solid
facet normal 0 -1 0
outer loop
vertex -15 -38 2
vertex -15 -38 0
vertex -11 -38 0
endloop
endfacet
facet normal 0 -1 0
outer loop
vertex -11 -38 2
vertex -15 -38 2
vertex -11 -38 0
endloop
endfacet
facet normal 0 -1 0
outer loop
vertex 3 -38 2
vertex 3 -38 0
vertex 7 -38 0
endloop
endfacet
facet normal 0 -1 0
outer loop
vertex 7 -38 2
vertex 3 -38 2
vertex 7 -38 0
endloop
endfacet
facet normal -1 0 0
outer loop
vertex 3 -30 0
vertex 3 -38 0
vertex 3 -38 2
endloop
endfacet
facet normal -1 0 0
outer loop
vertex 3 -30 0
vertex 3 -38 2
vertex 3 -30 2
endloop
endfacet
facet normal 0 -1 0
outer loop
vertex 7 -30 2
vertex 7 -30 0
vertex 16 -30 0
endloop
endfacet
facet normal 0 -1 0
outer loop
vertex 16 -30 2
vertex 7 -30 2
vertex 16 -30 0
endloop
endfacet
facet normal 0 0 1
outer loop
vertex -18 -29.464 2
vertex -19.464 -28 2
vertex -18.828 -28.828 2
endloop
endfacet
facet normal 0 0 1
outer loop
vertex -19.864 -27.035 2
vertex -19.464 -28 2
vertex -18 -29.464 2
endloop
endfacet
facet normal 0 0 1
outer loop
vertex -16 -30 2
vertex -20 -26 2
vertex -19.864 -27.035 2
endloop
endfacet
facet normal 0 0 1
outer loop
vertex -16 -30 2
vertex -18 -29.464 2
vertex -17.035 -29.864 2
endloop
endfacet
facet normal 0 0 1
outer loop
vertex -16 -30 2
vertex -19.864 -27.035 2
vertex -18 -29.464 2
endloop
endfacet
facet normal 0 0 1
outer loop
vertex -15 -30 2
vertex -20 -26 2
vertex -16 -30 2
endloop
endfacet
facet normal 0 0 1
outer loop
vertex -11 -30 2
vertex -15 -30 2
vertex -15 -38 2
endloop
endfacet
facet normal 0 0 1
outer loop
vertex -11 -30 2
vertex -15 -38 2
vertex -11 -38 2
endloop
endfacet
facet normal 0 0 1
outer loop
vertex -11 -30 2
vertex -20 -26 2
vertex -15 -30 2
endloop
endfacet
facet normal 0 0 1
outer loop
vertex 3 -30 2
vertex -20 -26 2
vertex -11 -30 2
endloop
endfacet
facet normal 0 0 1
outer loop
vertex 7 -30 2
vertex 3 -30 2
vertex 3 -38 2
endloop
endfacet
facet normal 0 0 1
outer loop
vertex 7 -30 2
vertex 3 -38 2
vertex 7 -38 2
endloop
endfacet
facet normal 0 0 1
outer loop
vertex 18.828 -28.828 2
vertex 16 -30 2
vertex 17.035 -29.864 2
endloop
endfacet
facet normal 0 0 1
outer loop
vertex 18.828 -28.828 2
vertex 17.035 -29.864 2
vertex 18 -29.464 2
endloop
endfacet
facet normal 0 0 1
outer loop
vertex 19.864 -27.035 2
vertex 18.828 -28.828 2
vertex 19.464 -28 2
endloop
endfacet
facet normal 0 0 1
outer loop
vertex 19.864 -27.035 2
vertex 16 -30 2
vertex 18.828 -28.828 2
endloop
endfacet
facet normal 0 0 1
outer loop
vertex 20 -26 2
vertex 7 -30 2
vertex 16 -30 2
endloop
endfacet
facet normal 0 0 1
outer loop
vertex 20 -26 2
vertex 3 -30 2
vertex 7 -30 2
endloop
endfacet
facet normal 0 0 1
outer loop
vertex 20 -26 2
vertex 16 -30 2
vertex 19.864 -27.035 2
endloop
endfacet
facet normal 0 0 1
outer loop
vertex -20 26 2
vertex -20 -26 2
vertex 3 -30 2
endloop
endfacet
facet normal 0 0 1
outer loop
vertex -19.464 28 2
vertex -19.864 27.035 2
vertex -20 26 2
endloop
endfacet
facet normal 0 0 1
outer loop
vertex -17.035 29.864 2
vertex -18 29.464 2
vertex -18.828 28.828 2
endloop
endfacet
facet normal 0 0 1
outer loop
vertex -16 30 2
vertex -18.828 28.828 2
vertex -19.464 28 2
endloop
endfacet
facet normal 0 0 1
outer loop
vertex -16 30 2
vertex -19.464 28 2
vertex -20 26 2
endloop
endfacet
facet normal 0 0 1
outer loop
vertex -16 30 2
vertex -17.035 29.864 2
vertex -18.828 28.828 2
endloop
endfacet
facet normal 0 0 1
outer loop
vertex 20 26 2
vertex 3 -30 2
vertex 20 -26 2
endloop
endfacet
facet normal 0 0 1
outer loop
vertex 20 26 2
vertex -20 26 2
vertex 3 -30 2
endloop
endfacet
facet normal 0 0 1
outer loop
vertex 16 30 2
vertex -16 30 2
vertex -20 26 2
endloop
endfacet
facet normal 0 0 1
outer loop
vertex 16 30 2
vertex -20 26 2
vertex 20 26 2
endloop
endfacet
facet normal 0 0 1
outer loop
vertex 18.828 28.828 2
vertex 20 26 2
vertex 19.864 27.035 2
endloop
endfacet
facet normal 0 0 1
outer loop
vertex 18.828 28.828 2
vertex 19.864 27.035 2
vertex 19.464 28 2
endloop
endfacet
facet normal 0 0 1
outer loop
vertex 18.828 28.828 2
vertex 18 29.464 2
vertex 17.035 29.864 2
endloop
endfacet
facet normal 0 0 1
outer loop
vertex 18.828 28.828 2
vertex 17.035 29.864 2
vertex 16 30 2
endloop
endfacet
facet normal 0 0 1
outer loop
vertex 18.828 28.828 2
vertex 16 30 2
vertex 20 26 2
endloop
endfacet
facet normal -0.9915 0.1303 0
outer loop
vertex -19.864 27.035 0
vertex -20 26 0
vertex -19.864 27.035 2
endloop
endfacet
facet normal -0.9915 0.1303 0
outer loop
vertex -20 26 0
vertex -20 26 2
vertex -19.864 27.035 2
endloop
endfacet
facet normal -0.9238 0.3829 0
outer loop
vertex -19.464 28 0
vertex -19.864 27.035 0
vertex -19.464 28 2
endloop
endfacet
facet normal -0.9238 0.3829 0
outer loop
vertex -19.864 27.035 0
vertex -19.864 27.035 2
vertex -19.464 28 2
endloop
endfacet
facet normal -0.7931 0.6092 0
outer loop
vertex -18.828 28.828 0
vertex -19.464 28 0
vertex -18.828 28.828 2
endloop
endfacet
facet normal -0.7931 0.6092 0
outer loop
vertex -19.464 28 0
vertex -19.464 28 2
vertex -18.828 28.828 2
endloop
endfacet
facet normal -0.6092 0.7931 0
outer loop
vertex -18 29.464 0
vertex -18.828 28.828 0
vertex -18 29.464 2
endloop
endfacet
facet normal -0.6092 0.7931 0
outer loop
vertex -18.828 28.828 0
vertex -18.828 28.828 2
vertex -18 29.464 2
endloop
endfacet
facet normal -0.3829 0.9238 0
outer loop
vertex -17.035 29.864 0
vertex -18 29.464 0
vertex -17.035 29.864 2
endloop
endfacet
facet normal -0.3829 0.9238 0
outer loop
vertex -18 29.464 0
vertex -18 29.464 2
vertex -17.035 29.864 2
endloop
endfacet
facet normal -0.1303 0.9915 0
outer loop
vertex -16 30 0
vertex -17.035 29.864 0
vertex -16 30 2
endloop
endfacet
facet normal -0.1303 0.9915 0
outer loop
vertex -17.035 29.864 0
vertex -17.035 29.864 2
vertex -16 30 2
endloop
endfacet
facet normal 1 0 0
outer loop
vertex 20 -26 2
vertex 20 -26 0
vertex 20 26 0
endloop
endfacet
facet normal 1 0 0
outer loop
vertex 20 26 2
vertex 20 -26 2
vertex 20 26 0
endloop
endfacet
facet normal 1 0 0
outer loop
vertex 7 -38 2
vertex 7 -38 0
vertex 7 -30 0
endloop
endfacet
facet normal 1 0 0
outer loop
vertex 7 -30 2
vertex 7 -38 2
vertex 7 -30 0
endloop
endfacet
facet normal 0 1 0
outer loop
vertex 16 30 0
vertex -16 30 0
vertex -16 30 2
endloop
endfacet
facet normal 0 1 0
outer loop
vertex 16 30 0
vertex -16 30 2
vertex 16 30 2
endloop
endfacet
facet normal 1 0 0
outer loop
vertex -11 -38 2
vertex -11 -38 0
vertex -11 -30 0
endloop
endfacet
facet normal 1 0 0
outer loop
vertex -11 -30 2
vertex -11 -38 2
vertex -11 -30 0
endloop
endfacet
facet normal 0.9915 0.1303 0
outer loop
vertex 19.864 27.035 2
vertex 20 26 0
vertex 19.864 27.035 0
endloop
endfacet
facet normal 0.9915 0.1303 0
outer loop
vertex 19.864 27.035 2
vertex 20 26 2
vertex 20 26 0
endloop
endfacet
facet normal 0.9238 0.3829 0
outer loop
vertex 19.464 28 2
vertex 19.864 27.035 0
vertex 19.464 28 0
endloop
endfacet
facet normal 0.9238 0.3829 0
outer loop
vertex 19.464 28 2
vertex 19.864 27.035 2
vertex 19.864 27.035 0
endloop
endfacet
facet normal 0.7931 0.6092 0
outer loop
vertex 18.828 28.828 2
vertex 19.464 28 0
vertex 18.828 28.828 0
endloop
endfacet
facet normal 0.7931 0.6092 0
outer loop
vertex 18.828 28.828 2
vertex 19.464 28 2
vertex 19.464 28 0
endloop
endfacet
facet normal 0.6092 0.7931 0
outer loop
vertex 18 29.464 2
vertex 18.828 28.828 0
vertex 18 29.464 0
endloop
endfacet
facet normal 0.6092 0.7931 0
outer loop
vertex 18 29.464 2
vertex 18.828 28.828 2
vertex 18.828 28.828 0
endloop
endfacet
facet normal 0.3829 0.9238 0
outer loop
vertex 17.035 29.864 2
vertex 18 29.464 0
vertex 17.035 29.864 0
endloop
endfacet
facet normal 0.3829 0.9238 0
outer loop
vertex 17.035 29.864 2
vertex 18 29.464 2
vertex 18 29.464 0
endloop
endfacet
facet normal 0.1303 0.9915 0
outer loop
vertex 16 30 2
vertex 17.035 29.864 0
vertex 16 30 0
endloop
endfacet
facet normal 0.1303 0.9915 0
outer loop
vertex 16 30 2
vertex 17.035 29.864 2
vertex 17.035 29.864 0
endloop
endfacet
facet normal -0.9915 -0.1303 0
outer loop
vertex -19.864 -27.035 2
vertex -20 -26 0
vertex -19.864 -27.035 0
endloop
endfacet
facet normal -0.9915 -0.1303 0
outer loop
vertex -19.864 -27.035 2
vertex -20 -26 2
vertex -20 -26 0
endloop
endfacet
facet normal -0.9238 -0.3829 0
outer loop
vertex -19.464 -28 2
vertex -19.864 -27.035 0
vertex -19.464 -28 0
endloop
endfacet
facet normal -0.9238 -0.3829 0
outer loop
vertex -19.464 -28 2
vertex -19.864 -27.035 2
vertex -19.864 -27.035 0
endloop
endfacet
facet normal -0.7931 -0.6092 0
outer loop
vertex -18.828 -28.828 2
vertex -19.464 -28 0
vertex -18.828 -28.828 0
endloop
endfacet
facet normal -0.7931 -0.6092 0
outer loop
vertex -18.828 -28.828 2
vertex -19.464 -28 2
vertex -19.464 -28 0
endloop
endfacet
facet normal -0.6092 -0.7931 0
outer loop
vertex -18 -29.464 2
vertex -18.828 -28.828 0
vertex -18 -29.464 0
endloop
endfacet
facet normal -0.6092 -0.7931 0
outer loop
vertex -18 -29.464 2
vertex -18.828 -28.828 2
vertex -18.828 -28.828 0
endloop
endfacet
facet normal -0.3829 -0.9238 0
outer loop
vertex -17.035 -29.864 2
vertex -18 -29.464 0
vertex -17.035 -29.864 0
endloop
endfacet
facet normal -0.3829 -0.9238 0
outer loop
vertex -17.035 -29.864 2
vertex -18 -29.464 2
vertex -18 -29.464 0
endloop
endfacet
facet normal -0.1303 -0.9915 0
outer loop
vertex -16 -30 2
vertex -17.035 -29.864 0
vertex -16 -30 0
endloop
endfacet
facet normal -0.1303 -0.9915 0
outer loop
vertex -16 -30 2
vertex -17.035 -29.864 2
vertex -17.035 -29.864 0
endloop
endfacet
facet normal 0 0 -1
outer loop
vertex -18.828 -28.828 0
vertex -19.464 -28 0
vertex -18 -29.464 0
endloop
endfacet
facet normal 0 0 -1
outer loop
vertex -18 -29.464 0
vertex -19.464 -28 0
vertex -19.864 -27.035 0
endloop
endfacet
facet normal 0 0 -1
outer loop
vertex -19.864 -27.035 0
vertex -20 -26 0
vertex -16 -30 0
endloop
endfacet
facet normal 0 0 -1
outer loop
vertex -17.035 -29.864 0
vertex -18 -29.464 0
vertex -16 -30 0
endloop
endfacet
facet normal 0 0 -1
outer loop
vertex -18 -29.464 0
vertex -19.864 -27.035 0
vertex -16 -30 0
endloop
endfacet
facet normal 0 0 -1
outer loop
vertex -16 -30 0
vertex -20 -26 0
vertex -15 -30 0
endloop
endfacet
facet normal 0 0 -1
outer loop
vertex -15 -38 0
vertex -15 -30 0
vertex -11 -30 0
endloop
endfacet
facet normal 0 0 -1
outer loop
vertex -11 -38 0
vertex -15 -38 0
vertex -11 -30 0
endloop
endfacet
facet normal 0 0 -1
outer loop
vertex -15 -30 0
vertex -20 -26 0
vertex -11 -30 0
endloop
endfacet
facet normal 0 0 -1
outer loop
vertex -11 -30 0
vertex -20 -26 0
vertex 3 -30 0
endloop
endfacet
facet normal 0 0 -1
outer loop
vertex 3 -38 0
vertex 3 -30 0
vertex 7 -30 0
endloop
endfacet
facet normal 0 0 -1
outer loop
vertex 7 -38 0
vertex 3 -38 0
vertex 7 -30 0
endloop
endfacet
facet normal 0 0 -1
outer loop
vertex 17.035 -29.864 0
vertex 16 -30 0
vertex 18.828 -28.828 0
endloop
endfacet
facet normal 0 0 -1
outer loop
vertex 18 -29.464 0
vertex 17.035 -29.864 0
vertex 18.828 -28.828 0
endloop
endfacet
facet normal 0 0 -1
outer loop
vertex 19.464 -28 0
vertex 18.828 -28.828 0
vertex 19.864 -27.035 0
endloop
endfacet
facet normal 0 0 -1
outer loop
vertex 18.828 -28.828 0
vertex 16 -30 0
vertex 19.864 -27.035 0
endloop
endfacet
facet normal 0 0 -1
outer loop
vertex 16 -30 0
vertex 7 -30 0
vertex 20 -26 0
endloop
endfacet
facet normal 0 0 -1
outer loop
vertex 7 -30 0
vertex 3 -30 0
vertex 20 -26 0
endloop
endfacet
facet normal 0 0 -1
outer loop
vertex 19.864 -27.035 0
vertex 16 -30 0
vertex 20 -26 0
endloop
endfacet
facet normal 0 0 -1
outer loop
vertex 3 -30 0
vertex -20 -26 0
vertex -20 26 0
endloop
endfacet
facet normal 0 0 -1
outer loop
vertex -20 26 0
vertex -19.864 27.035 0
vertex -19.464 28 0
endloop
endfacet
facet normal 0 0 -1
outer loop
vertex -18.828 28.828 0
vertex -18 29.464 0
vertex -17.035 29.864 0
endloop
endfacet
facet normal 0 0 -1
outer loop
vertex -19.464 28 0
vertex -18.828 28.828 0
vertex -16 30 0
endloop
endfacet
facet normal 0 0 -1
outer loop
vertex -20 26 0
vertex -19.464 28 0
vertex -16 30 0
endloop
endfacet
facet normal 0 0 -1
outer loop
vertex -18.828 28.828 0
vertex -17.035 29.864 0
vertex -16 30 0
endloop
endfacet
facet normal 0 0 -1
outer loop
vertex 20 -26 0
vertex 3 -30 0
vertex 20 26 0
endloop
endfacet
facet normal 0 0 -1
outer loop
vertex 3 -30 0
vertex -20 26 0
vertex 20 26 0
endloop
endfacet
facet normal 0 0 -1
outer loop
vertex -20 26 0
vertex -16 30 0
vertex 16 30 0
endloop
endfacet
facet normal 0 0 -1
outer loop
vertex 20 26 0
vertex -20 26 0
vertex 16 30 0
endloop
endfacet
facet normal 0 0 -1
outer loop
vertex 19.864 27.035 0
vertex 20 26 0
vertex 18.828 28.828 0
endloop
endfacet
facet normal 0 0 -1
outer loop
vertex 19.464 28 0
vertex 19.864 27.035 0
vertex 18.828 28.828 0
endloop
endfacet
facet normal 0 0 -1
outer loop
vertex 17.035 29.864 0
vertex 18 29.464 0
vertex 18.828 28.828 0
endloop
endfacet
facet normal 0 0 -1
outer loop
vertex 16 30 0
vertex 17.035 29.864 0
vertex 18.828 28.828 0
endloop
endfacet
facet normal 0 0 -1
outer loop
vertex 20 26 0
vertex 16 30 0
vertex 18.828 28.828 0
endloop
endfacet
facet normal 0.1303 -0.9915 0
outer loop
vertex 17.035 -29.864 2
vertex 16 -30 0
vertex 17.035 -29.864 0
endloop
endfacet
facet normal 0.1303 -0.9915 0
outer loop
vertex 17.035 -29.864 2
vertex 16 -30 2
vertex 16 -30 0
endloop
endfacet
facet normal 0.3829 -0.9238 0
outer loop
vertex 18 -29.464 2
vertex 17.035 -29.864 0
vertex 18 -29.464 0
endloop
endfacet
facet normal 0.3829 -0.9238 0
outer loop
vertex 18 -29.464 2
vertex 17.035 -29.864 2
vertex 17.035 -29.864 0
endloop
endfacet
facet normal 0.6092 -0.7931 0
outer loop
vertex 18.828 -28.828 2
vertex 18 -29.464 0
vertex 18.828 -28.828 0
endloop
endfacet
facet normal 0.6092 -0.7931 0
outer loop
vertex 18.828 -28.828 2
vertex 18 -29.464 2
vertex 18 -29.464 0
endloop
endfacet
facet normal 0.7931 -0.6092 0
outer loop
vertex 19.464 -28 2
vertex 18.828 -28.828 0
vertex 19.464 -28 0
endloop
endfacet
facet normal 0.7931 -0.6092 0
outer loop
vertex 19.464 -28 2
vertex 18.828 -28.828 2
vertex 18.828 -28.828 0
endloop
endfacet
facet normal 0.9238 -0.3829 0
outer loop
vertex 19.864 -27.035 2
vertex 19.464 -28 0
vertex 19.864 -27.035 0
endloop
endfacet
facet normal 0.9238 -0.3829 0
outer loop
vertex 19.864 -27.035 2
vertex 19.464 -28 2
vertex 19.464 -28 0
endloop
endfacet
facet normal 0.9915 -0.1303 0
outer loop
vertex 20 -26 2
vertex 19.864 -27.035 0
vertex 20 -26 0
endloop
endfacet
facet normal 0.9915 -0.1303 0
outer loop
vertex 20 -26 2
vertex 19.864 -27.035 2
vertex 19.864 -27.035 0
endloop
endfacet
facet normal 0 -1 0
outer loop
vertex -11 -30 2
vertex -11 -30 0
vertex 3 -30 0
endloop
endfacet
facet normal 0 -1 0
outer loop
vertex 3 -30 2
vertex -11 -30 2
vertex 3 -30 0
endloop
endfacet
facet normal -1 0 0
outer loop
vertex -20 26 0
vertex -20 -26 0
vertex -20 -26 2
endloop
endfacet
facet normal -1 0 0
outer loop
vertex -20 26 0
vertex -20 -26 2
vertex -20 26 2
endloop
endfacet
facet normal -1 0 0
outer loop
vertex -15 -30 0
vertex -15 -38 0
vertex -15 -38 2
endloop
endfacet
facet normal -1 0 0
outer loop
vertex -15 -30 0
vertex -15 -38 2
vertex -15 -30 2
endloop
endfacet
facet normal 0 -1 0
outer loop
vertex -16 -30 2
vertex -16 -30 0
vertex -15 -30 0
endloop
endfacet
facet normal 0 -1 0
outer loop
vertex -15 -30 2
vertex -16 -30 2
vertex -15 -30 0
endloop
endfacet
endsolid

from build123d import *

# Parameters (mm, degrees)
SKETCH_1_W      = 40
SKETCH_1_H      = 60
SKETCH_1_W_2    = 4
SKETCH_1_H_2    = 8
EXTRUDE_1_DEPTH = 2
FILLET_1_R      = 4


with BuildPart() as part:
    # 草图1 → 凸台-拉伸1 (new body)
    with BuildSketch(Plane.XY):
        Rectangle(SKETCH_1_W, SKETCH_1_H)
        with Locations((-13, -34)):
            Rectangle(SKETCH_1_W_2, SKETCH_1_H_2)
        with Locations((5, -34)):
            Rectangle(SKETCH_1_W_2, SKETCH_1_H_2)
    extrude(amount=EXTRUDE_1_DEPTH)

    # 圆角1
    fillet_1_edges = [part.edges().sort_by_distance(p)[0] for p in [
        (20, -30, 1),
        (-20, -30, 1),
        (-20, 30, 1),
        (20, 30, 1),
    ]]
    fillet(fillet_1_edges, radius=FILLET_1_R)


solid = part.part
